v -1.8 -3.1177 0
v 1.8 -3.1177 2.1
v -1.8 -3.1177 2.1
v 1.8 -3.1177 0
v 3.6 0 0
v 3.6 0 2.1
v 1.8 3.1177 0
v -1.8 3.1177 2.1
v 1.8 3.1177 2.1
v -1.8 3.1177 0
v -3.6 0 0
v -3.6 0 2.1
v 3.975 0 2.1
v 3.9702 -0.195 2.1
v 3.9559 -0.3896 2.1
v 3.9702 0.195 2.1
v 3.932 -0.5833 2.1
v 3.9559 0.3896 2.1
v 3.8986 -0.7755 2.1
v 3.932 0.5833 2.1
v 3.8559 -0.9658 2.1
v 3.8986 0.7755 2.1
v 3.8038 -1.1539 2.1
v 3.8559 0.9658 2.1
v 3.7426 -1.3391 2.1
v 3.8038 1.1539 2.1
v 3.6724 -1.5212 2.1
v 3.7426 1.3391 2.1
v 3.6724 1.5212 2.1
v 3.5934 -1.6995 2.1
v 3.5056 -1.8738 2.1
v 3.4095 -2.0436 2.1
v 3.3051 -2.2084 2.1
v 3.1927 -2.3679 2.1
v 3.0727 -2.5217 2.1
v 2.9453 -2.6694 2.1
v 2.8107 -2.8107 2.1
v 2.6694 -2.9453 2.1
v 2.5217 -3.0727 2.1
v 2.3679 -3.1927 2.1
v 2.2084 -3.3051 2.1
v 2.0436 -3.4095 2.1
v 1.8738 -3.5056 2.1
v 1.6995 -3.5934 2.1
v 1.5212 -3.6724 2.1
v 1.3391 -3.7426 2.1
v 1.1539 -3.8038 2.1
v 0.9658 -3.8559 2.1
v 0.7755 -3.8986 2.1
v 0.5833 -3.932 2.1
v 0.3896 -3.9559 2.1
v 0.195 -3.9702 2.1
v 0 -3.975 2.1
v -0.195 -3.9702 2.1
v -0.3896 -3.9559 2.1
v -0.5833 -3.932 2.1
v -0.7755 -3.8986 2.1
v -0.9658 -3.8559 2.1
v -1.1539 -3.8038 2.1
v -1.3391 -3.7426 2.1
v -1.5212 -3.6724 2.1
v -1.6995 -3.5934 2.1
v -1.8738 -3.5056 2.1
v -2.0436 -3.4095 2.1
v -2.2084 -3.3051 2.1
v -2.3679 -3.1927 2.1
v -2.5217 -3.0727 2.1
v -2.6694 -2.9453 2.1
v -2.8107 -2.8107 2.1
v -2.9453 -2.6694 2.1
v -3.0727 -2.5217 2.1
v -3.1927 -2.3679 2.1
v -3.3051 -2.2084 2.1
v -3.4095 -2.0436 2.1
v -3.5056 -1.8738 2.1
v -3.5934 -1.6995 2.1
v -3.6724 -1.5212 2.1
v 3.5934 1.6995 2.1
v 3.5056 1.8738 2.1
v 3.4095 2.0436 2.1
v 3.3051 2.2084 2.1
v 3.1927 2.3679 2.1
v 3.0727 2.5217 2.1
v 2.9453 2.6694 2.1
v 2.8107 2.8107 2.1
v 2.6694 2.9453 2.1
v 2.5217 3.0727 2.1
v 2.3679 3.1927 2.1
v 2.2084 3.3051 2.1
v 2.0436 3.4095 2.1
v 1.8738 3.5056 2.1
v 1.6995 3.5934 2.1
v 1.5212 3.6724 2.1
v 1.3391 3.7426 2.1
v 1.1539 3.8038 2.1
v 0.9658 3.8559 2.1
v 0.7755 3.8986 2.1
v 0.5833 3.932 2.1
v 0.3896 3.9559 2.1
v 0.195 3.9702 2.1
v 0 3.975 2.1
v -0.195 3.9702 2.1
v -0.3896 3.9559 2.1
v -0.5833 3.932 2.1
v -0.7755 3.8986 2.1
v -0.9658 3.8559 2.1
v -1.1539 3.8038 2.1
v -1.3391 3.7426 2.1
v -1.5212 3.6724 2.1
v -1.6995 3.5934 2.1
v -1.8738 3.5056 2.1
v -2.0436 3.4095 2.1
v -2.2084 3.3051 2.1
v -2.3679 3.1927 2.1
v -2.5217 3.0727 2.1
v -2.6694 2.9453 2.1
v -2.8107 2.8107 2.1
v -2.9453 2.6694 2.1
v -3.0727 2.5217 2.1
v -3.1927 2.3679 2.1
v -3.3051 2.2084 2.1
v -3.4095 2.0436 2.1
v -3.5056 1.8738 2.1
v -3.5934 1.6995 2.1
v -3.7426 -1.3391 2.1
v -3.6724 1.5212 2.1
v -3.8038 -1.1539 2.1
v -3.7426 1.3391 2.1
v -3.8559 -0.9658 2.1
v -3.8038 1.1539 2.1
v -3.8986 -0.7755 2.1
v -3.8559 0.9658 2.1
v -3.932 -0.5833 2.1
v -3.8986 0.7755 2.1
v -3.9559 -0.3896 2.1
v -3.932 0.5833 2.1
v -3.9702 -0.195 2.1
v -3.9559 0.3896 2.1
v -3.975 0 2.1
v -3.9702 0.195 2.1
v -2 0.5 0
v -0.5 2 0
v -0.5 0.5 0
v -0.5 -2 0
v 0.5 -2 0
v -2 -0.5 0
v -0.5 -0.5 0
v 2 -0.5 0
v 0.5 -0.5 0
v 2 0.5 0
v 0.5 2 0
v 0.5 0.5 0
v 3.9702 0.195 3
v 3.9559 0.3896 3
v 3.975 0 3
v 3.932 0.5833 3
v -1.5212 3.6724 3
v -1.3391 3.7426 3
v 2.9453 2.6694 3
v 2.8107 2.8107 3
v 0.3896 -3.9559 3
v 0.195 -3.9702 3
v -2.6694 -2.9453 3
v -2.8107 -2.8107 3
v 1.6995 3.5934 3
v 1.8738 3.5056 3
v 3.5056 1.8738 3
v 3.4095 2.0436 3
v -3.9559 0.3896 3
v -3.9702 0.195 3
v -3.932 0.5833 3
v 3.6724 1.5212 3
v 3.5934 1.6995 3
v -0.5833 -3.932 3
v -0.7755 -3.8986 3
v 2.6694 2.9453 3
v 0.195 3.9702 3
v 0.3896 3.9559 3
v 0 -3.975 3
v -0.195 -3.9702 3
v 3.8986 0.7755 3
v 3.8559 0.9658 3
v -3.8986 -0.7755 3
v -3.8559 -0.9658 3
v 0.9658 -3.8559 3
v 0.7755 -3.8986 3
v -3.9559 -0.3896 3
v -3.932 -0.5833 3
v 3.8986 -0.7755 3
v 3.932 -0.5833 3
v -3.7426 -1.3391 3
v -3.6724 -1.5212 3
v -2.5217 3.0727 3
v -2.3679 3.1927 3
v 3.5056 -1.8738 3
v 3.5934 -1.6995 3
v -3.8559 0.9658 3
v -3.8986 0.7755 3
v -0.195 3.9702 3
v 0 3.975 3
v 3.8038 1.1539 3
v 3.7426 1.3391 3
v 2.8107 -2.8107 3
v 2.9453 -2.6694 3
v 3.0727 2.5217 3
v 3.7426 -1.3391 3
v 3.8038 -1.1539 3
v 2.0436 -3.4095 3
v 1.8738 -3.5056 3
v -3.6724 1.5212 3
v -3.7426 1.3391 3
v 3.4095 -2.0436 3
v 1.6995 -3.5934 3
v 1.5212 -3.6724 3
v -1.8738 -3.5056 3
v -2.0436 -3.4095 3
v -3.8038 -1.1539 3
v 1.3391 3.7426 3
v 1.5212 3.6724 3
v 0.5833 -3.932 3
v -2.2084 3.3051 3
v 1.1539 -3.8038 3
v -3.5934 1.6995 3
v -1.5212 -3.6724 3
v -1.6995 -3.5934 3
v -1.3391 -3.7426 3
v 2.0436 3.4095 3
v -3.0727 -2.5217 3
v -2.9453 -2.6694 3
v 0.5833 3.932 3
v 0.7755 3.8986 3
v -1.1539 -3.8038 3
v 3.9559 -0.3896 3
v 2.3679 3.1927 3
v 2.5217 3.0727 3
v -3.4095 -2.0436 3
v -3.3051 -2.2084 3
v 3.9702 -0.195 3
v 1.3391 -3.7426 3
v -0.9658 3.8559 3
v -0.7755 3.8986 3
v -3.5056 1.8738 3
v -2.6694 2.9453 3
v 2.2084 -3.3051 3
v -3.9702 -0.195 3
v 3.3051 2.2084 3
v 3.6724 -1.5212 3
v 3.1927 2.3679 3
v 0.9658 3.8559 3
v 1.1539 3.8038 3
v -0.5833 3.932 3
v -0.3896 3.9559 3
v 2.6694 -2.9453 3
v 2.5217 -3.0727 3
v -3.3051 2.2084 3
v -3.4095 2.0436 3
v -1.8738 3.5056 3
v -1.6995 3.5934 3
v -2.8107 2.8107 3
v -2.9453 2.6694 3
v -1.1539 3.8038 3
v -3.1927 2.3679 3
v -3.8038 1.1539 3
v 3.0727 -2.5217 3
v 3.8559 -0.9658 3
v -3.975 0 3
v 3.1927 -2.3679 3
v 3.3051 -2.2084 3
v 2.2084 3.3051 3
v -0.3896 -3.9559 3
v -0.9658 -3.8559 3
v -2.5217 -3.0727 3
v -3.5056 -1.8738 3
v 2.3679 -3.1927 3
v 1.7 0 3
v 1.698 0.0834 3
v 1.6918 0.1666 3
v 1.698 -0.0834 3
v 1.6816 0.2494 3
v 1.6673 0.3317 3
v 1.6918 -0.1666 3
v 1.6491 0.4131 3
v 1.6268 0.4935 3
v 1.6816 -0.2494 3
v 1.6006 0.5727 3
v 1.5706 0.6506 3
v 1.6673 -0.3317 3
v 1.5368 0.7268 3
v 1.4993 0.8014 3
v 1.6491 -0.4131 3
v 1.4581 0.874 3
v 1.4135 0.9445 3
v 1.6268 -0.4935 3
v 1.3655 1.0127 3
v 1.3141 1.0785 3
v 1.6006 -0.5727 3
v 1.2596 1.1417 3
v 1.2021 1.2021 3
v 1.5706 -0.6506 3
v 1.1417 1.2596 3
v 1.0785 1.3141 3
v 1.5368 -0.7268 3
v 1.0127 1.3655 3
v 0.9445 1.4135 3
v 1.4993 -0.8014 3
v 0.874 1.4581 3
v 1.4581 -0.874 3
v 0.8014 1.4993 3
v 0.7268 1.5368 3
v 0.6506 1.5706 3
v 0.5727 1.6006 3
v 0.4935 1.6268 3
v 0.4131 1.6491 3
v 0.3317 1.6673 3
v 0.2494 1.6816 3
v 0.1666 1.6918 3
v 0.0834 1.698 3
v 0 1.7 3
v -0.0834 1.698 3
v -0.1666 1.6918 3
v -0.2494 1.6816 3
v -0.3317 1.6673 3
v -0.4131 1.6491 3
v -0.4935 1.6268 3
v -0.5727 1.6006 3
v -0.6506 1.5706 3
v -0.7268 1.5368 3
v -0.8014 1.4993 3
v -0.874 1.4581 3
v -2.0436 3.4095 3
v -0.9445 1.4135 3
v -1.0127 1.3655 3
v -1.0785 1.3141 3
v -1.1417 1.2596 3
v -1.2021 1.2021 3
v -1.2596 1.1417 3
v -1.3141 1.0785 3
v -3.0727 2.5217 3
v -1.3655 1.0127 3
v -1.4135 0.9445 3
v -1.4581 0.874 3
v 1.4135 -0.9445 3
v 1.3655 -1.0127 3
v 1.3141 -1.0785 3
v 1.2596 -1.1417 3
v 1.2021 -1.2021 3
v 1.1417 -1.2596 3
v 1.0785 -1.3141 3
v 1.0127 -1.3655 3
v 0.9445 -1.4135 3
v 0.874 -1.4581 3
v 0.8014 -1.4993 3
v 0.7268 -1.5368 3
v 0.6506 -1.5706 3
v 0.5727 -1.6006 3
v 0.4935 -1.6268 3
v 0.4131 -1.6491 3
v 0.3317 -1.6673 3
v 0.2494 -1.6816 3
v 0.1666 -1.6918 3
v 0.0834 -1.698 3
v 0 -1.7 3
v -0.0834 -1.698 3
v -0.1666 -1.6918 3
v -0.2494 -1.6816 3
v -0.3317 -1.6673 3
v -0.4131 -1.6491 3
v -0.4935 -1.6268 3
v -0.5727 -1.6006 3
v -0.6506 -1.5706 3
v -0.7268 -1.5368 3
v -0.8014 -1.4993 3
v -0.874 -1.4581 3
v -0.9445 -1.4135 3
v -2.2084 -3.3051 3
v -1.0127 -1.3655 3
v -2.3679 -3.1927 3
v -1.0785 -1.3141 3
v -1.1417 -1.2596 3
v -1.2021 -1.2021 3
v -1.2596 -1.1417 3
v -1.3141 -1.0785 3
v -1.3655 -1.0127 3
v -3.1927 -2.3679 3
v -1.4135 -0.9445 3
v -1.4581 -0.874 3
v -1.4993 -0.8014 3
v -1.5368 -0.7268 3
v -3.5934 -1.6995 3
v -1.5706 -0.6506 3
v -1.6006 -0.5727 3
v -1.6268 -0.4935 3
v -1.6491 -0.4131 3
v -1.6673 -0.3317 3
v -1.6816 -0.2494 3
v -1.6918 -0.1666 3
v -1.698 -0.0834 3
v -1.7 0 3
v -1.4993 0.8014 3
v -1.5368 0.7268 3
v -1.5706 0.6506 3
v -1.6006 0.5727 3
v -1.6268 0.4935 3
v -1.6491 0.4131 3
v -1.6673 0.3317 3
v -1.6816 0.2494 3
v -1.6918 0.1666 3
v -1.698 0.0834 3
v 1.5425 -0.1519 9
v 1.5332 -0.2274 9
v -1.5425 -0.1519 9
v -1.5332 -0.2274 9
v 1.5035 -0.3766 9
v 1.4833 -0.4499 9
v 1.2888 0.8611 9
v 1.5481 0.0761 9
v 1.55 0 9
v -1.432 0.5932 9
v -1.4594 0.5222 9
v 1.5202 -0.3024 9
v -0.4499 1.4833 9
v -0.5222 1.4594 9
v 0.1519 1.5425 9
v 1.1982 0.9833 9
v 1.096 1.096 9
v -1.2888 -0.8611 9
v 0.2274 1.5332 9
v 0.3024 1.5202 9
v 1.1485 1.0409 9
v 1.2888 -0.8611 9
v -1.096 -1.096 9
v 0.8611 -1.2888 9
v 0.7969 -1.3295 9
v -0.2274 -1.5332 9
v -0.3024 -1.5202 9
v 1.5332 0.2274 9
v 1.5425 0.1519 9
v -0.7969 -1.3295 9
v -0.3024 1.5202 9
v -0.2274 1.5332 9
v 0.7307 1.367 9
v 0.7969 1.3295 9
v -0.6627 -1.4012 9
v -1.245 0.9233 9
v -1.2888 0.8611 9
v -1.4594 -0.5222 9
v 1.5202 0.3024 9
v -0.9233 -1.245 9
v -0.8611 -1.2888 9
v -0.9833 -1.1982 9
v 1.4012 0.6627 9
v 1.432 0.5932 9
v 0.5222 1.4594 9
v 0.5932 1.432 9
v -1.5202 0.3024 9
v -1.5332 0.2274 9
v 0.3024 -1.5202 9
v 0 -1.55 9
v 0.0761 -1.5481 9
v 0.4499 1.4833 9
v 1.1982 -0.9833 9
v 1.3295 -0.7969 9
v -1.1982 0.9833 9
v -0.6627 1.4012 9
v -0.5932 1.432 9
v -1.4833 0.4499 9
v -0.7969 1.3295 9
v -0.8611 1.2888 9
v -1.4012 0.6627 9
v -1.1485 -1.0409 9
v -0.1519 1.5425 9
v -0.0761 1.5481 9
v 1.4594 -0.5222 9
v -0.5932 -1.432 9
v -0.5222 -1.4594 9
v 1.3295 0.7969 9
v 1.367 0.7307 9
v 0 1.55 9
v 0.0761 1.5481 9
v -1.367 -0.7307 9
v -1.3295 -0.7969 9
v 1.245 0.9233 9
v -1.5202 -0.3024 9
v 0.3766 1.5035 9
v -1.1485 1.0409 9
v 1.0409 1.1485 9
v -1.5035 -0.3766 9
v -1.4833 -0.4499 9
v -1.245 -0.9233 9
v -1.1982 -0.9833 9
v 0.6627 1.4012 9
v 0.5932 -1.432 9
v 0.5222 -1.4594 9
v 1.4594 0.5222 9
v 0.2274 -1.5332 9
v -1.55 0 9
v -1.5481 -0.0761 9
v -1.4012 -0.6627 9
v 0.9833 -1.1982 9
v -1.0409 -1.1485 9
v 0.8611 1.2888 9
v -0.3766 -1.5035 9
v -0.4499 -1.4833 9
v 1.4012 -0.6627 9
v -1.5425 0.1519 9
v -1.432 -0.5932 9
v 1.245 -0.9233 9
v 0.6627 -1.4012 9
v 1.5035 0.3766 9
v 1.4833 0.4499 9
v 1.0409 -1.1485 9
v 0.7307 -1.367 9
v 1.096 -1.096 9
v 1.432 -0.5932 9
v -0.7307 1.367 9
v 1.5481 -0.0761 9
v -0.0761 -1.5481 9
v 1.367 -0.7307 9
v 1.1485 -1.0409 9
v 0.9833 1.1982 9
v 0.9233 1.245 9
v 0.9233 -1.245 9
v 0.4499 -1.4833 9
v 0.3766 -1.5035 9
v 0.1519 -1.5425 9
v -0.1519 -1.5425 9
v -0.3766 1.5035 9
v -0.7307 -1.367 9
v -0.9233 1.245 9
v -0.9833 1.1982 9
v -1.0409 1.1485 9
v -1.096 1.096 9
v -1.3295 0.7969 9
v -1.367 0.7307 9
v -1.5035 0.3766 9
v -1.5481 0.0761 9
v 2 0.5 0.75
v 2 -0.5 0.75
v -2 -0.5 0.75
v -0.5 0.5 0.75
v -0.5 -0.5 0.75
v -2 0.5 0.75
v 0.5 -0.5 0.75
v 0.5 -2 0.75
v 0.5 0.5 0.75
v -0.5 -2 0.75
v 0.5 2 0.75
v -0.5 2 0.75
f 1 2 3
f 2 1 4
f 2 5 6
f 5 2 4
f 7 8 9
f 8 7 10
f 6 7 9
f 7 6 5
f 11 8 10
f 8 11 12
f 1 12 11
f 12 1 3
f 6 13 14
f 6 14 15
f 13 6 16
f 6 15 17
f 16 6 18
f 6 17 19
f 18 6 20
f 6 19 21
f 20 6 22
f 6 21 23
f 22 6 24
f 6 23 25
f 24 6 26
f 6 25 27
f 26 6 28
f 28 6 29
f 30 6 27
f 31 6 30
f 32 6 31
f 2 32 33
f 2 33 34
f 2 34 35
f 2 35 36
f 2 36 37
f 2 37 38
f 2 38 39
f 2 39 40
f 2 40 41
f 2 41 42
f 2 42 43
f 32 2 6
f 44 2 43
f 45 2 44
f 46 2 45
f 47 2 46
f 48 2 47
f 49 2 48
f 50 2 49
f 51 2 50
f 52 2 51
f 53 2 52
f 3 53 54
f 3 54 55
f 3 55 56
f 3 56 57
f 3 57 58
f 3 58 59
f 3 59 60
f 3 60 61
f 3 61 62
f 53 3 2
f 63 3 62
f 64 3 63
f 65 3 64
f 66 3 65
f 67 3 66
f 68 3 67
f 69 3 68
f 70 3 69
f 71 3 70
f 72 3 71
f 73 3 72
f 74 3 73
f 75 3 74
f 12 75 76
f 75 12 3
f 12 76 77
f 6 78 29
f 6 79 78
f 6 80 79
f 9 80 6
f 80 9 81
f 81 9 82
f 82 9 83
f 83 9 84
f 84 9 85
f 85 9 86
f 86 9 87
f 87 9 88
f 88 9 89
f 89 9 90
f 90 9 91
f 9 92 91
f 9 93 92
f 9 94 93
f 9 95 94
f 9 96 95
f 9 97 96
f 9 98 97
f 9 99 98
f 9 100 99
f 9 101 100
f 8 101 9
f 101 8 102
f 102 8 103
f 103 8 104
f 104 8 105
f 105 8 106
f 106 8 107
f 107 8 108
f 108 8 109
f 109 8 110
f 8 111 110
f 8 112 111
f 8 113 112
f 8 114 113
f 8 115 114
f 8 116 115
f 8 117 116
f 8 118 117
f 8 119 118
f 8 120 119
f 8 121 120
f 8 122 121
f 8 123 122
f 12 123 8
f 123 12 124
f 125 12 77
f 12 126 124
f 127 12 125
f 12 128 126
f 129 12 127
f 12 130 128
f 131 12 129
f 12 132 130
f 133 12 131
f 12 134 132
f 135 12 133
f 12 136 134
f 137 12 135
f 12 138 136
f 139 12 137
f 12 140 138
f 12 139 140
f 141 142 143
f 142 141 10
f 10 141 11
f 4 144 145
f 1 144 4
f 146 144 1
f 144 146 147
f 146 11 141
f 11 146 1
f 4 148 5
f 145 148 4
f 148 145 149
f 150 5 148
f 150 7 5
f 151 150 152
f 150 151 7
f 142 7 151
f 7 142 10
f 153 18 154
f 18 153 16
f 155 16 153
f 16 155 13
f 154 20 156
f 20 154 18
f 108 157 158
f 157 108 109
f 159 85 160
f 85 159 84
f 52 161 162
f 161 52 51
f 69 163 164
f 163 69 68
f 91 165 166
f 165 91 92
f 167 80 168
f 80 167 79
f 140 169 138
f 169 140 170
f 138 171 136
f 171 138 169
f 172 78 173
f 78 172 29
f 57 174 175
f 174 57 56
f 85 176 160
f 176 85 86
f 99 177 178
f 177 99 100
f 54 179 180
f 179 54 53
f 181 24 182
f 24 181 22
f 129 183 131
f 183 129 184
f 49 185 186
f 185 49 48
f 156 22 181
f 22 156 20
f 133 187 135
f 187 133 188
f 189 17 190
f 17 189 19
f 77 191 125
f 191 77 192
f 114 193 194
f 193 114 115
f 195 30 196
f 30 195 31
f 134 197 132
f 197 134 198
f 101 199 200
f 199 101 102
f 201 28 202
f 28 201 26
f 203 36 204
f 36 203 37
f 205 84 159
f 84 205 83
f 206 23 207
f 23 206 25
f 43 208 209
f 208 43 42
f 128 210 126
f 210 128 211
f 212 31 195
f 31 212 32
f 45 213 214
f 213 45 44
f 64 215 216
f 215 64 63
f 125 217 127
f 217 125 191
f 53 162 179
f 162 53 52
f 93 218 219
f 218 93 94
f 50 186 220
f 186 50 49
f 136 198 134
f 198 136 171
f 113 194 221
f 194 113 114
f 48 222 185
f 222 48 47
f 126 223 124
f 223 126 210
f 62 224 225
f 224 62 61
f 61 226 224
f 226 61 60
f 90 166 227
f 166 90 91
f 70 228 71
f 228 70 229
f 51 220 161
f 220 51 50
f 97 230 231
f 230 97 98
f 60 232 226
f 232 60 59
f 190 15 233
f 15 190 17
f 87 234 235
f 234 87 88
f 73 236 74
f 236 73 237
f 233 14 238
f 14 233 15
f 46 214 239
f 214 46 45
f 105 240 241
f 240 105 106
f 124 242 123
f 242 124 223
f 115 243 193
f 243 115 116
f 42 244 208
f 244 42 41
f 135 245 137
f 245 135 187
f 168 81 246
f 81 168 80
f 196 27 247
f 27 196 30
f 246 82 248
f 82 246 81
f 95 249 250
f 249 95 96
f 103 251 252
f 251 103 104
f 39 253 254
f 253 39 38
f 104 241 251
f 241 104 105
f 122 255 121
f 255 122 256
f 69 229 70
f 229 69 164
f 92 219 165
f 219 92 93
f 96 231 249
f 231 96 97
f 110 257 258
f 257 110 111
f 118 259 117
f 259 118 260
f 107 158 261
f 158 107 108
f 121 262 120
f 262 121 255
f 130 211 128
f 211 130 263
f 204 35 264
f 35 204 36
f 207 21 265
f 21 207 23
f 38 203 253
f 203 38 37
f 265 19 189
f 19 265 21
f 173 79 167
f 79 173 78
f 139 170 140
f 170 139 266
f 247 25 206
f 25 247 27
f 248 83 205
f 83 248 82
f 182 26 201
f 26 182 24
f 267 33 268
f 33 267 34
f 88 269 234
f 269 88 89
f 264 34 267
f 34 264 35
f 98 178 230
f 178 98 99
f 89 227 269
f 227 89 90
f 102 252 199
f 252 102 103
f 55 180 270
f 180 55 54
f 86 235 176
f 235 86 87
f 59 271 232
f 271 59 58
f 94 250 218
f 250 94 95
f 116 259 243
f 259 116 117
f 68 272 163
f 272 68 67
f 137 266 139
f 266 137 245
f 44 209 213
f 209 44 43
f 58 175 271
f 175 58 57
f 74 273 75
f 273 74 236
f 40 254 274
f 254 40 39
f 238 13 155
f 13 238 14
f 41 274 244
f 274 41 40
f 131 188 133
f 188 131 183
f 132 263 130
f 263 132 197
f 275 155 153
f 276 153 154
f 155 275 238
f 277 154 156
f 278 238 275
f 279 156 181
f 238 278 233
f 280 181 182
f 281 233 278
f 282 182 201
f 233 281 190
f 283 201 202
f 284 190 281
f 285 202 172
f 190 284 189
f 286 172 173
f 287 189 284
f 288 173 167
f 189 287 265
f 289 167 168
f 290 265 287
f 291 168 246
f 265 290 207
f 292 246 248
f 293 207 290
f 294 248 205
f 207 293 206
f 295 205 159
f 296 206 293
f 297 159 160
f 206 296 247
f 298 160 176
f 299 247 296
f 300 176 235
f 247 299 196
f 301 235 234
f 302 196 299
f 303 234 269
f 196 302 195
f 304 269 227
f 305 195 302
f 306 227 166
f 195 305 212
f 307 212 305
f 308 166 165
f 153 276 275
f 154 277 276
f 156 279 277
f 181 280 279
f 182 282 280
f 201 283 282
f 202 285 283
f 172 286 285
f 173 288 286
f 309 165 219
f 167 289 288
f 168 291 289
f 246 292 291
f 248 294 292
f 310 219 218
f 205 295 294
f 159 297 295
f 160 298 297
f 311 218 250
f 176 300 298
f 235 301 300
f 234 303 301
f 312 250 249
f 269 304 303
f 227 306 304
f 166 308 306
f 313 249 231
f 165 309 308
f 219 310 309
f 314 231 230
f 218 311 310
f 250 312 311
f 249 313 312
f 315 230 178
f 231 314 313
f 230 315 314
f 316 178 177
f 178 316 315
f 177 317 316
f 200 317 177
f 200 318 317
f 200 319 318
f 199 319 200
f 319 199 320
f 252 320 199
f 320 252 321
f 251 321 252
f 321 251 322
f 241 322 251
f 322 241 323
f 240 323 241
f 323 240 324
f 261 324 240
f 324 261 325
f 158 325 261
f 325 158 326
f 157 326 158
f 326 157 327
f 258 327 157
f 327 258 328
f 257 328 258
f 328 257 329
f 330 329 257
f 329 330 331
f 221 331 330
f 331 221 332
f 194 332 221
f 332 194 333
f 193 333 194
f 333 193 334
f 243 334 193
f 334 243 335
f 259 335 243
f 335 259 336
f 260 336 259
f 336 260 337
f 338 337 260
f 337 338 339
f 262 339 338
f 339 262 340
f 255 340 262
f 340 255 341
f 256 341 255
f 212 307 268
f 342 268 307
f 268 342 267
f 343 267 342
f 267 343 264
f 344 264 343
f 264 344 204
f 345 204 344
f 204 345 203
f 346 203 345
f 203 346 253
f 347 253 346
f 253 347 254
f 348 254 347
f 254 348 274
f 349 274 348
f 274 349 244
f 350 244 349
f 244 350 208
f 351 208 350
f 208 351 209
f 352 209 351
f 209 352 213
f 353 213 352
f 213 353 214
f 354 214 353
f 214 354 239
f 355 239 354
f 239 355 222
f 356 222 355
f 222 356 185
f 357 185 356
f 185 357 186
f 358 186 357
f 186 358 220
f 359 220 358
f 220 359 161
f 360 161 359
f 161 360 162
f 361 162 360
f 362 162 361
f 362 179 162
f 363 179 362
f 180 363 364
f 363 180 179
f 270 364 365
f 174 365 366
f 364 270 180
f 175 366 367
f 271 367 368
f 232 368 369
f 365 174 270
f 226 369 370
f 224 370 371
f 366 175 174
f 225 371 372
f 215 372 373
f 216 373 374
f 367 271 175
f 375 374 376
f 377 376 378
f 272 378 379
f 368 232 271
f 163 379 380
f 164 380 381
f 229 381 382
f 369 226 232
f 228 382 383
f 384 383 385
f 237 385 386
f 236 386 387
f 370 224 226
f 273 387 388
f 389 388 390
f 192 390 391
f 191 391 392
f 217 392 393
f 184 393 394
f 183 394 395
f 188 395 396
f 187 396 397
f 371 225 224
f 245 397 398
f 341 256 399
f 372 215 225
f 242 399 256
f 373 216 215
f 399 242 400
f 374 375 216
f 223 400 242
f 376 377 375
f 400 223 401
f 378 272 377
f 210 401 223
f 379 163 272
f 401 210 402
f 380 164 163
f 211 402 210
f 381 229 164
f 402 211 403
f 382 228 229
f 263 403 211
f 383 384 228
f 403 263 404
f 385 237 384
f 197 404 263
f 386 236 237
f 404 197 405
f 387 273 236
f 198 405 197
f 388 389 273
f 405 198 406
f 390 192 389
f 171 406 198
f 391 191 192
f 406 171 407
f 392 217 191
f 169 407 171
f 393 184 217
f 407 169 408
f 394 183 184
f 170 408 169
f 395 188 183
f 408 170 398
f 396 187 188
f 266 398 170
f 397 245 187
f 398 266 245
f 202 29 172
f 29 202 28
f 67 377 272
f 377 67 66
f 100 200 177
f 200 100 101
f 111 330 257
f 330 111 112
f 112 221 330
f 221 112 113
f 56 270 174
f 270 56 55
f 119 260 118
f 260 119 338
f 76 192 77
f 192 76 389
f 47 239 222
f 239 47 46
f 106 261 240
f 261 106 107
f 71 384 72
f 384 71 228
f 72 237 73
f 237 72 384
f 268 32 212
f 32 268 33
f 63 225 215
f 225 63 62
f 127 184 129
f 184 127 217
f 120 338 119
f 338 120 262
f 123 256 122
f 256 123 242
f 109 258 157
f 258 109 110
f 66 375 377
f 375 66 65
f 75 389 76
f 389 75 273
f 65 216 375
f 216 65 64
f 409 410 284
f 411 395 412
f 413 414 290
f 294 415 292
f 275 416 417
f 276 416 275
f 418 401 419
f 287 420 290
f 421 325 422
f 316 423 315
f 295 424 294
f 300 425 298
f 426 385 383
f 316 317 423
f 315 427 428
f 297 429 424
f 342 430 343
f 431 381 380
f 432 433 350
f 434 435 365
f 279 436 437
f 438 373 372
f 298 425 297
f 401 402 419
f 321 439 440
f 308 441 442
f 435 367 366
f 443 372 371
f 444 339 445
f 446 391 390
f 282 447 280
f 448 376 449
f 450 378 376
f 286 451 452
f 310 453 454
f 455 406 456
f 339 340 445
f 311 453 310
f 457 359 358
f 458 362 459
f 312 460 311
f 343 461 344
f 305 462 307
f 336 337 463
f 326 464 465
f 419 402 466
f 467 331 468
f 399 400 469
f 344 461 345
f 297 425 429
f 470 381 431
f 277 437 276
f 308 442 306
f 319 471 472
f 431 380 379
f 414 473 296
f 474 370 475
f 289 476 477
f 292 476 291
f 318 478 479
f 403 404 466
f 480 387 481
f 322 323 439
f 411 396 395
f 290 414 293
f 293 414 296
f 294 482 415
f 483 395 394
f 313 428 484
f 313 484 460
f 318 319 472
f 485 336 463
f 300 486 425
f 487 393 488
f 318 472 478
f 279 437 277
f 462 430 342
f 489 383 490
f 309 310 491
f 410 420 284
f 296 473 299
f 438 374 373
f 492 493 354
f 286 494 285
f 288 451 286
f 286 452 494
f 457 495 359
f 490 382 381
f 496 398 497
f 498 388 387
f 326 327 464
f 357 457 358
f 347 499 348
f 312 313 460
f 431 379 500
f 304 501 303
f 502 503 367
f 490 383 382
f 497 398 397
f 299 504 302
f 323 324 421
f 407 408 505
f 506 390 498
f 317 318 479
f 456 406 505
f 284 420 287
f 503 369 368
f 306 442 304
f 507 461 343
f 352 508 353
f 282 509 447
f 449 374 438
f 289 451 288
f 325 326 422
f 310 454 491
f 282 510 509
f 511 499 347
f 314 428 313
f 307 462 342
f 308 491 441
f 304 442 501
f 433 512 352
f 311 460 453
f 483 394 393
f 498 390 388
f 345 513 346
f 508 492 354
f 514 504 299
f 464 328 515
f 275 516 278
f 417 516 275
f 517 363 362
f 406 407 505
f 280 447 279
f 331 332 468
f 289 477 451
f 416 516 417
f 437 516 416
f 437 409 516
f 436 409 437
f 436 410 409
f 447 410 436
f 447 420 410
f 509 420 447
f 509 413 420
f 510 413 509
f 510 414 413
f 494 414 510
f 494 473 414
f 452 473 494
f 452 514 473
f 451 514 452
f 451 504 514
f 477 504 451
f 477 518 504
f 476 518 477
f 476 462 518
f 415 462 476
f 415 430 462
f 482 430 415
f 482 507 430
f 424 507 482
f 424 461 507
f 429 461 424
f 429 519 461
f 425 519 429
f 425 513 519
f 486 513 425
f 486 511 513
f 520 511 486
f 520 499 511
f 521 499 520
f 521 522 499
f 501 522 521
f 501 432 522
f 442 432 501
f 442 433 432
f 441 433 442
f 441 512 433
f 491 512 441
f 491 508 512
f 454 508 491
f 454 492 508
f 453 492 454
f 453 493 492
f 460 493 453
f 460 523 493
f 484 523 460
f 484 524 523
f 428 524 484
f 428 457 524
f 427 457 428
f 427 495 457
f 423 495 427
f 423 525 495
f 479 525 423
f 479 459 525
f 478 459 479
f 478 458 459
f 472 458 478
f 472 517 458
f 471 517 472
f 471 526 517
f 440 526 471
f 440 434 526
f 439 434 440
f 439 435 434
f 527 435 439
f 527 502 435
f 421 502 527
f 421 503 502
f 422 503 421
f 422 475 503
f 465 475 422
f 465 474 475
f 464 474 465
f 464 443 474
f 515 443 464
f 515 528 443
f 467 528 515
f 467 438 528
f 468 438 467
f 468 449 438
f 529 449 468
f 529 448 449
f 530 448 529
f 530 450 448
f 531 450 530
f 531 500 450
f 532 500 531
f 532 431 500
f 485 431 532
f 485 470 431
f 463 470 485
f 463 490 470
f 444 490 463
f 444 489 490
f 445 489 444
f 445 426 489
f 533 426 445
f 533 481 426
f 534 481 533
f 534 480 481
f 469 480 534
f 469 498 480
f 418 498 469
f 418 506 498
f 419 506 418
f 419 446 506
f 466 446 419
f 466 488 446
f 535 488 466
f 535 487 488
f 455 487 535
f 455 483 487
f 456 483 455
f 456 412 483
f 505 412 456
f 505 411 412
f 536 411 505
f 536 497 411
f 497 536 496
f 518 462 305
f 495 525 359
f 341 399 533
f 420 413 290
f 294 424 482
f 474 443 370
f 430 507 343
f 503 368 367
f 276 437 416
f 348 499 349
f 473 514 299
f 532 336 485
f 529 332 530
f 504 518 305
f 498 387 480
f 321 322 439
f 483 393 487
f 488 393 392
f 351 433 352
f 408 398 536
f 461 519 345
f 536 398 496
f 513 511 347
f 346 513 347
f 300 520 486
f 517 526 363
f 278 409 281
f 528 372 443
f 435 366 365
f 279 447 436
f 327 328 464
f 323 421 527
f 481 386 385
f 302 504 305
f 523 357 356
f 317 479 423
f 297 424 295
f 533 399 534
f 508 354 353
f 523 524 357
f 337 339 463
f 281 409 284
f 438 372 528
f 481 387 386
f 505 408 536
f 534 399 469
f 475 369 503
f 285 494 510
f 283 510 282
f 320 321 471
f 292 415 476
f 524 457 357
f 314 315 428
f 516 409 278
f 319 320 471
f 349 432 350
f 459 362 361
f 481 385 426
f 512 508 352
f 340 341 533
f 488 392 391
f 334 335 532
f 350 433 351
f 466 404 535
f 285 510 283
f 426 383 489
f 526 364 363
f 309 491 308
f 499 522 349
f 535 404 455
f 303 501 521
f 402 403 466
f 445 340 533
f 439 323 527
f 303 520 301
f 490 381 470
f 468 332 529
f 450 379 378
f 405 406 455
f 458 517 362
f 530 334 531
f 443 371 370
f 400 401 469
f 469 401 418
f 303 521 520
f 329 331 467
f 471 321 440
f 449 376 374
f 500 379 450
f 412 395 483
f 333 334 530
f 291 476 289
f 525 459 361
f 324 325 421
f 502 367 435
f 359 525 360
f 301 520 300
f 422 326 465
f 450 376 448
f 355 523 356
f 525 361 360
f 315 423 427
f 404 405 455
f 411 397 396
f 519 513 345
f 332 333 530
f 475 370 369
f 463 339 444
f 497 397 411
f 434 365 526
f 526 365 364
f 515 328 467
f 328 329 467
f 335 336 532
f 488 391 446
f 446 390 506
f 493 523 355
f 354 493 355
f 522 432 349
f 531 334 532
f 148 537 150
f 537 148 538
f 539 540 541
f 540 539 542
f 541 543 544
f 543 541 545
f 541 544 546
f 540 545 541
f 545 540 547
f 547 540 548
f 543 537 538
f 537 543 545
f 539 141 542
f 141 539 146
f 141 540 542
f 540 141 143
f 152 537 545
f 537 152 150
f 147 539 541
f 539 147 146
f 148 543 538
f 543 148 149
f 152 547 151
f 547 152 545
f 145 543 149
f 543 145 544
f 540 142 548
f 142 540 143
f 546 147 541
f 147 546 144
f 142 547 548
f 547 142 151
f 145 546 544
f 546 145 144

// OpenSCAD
// https://www.amazon.fr/TOOGOO-Quadrex-courte-Boitier-dordinateur/dp/B00KBPORXU/ref=sr_1_33?__mk_fr_FR=%C3%85M%C3%85%C5%BD%C3%95%C3%91&keywords=visserie+ordinateur&qid=1583356374&sr=8-33


module screw(center_screwed_position = false) {

    _fn = 128;
    head_height = 2.1;
    middle_height = 0.9;
    bottom_height = 6;

    z_centring_translation = center_screwed_position ? -head_height -middle_height : 0;

    translate([0,0, z_centring_translation])
        color("#BBB")
            difference() {
                union() {
                    cylinder(r = 7.20 / 2, h = head_height, $fn = 6);
                    
                    translate([0, 0, head_height])
                        cylinder(r = 7.95 / 2, h = middle_height, $fn = _fn);
                    
                    translate([0, 0, head_height + middle_height])
                        cylinder(r1 = 3.4 / 2, r2 = 3.1 / 2, h = bottom_height, $fn = _fn);
                }

                union() {
                    cube([4,1,1.5], center = true);
                    cube([1,4,1.5], center = true);
                }
            }
}

screw();
